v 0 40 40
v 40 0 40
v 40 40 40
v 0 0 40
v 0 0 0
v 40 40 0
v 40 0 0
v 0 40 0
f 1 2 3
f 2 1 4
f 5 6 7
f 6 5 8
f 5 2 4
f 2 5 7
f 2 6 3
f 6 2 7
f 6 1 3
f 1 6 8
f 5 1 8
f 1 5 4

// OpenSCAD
// Unsaved Native Agent acceptance buffer
base=80;
width=base/2; // [10:100]
cube(width);
